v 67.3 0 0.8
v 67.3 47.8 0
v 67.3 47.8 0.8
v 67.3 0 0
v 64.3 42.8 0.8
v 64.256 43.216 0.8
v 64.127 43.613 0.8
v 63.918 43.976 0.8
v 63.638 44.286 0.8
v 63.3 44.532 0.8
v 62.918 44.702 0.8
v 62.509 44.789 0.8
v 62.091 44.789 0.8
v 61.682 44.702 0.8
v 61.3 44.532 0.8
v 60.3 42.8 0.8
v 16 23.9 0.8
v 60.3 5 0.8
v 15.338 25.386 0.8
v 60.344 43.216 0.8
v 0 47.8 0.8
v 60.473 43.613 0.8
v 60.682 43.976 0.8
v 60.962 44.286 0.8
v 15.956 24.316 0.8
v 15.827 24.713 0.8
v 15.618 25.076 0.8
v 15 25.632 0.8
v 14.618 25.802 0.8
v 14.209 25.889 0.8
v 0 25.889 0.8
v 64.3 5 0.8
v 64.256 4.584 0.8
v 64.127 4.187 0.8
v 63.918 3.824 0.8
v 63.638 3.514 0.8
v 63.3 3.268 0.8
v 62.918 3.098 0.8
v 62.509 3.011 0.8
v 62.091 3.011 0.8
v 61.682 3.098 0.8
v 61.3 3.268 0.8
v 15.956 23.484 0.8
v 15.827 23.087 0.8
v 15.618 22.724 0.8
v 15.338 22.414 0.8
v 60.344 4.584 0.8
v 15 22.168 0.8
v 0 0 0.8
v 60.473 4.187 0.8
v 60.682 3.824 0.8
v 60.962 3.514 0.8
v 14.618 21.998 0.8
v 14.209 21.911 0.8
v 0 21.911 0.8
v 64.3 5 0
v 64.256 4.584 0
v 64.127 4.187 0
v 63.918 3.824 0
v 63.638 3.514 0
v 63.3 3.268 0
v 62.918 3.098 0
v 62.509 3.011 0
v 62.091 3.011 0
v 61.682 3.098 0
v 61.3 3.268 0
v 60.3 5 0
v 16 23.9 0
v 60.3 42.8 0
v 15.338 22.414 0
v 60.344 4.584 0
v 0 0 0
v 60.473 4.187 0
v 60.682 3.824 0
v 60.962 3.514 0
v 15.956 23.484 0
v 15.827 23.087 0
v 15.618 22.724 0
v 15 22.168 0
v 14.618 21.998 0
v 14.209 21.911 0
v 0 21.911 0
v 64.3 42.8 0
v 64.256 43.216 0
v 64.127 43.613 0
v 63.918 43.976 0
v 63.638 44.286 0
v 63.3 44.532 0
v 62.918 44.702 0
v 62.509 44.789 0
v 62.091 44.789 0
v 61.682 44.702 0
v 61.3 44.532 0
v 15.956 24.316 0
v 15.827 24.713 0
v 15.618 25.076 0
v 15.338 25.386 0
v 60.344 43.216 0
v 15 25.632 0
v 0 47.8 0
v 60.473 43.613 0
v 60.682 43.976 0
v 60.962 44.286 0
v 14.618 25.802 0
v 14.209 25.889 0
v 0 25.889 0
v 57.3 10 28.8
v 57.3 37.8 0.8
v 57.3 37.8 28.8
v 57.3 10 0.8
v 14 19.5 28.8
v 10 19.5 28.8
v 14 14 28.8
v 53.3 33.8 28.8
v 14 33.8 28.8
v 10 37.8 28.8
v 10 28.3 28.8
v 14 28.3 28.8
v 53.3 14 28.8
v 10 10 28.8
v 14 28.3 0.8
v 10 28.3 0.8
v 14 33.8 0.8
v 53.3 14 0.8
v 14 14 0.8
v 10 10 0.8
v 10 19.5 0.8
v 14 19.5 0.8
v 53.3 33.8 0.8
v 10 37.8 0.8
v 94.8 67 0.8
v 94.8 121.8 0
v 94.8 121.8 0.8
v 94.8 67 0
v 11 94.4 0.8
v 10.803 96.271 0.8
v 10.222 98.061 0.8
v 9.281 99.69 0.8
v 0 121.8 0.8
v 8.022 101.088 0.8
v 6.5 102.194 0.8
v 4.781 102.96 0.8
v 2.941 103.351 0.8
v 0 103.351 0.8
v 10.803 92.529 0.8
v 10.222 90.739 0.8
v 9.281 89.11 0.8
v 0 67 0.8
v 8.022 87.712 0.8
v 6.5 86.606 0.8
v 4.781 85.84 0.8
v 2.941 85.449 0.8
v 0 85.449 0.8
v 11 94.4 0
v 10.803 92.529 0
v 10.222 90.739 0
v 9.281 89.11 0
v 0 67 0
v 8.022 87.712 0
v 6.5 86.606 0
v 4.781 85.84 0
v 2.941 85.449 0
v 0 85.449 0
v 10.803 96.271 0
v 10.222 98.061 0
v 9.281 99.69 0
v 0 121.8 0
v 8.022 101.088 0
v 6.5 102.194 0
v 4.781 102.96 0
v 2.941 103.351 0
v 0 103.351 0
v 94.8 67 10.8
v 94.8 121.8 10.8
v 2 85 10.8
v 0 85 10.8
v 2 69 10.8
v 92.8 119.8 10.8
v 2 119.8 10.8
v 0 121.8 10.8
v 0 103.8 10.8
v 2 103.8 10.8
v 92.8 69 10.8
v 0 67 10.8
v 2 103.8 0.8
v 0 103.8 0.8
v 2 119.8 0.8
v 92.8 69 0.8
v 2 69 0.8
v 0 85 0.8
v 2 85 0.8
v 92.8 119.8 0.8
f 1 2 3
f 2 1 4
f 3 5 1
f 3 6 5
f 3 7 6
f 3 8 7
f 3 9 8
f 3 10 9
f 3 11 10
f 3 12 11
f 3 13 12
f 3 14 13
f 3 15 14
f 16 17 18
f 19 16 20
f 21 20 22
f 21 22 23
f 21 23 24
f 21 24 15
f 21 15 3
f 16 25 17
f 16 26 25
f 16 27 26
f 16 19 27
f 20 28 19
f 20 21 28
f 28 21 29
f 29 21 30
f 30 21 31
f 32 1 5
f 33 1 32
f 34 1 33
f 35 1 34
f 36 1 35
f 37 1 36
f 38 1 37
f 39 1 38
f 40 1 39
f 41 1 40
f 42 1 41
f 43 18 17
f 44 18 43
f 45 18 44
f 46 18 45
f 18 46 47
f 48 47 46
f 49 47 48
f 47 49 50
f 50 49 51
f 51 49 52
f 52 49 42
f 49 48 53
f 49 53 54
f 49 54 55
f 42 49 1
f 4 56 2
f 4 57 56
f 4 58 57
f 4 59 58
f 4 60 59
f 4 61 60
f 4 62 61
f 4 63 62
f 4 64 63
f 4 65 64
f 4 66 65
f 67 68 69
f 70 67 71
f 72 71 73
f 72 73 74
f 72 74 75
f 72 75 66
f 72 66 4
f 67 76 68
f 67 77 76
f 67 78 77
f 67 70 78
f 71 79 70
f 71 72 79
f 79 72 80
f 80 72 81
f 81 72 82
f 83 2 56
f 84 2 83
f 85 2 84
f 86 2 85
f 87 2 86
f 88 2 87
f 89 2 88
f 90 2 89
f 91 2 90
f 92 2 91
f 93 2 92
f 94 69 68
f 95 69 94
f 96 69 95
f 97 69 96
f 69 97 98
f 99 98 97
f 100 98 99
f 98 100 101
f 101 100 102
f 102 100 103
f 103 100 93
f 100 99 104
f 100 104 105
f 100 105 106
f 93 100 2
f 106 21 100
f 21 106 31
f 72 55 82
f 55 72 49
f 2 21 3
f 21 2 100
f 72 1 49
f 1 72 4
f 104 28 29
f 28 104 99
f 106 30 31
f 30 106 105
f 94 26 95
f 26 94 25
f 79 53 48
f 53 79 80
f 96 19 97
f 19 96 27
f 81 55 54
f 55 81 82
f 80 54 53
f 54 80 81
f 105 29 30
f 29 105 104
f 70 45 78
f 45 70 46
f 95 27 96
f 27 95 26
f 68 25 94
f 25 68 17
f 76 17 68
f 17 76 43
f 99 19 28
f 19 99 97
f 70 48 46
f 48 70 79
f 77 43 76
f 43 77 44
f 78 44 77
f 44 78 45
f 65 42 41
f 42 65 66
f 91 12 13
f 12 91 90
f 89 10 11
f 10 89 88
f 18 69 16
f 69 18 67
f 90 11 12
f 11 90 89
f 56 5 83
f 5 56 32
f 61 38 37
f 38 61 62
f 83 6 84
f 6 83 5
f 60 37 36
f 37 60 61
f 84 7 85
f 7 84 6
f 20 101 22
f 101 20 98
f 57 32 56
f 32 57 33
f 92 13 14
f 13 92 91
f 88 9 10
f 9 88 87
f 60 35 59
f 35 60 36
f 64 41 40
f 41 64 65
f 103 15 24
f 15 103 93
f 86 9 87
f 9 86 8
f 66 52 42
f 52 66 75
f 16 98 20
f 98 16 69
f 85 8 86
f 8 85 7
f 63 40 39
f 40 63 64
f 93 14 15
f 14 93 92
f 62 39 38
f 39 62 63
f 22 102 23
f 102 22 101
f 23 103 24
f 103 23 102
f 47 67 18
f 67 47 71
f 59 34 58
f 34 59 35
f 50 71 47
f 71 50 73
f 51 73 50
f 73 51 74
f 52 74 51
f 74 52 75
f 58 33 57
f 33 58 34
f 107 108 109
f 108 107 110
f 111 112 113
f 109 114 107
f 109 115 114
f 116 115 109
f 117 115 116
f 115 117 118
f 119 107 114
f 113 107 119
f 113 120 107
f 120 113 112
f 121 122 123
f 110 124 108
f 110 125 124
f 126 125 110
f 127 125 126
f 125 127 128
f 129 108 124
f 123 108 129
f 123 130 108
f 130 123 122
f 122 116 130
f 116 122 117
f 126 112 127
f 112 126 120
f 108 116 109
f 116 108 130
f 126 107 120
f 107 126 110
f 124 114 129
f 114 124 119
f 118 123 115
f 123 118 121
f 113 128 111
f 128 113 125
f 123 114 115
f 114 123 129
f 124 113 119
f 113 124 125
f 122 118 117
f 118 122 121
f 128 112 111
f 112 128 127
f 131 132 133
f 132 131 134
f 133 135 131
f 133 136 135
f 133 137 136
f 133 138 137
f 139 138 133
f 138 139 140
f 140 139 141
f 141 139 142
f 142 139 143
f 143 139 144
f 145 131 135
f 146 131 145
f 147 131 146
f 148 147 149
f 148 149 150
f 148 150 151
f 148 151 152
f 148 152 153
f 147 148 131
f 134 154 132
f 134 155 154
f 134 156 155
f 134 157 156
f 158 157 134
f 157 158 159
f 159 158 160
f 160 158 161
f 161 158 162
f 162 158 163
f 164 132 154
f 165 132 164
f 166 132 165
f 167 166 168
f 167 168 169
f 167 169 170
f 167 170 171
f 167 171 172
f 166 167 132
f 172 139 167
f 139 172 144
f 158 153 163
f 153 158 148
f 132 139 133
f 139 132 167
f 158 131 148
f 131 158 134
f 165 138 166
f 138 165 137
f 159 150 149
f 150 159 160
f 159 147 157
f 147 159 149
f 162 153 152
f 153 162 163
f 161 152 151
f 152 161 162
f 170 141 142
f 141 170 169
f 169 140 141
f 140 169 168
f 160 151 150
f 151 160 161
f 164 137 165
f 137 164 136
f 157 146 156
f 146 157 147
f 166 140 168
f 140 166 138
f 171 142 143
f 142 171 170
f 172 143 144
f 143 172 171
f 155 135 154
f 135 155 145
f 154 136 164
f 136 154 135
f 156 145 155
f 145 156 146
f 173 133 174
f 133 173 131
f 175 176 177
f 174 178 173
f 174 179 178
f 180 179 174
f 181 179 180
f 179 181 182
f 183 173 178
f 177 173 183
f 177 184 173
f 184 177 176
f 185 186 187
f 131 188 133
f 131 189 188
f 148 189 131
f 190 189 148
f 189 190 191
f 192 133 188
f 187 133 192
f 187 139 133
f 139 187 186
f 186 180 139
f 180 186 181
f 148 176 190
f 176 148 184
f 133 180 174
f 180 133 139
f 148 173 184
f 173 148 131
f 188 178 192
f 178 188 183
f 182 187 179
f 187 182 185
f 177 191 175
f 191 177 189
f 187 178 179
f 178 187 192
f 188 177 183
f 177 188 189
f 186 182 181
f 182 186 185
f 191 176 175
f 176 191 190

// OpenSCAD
sl = 38.5; // servo length
sw = 19; // servo width
sh = 28; // servo height
ss = 8; // servo slot width

bl = 90; // Business card length 
bw = 50; // Business card width 
bh = 10; // Business card height
bs = 18; // Business card slot size

t = 0.4; // tolerance

a = 0.8; // base height
b = 10; // Brim around holders
c = 4; // hole size
d = 4; // Wall thickness
w = 2; // Card holder wall thickness

$fs=0.02;

servo_holder();
translate([0,sw+2*b+2*d+20,0]) card_holder();


module servo_holder () {
    difference() {
        cube ([sl+2*b+2*d+2*t,sw+2*b+2*d+2*t,a]);
translate([0,b+sw/2+d+t,0]) hull() {
        cylinder (a, r=c/2);
        translate([b+d,0,0]) cylinder (a, r=c/2);
}
hull() {
        translate([sl+3*b/2+2*d+2*t,b/2,0]) cylinder (a, r=c/2);
        translate([sl+3*b/2+2*d+2*t,sw+3*b/2+d*2+t*2,0]) cylinder (a, r=c/2);
}
}
    translate([b,b,a]) difference() {
        // Main block
        cube([sl+2*t+2*d,sw+2*t+2*d,sh]);
        //servo
        translate([d,d,0]) cube([sl+2*t,sw+2*t,sh]);
        // servo wire slot
        translate([0,d+sw/2-ss/2,0]) cube([d,ss+2*t,sh]);
    }
}


module card_holder () {
    difference() {
        cube ([bl+2*w+2*t,bw+2*w+2*t,a]);
        translate([0,bw/2+w+t,0]) hull() {
            cylinder (a, r=bs/2);
            translate([w,0,0]) cylinder (a, r=bs/2);
        }
    }
    translate([0,0,a]) difference() {
        // Main block
        cube([bl+2*t+2*w,bw+2*w+2*t,bh]);
        //hole
        translate([w,w,0]) cube([bl+2*t,bw+2*t,bh]);
        // slot
        translate([0,w+bw/2-bs/2,0]) cube([w,bs+2*t,bh]);
    }
}
